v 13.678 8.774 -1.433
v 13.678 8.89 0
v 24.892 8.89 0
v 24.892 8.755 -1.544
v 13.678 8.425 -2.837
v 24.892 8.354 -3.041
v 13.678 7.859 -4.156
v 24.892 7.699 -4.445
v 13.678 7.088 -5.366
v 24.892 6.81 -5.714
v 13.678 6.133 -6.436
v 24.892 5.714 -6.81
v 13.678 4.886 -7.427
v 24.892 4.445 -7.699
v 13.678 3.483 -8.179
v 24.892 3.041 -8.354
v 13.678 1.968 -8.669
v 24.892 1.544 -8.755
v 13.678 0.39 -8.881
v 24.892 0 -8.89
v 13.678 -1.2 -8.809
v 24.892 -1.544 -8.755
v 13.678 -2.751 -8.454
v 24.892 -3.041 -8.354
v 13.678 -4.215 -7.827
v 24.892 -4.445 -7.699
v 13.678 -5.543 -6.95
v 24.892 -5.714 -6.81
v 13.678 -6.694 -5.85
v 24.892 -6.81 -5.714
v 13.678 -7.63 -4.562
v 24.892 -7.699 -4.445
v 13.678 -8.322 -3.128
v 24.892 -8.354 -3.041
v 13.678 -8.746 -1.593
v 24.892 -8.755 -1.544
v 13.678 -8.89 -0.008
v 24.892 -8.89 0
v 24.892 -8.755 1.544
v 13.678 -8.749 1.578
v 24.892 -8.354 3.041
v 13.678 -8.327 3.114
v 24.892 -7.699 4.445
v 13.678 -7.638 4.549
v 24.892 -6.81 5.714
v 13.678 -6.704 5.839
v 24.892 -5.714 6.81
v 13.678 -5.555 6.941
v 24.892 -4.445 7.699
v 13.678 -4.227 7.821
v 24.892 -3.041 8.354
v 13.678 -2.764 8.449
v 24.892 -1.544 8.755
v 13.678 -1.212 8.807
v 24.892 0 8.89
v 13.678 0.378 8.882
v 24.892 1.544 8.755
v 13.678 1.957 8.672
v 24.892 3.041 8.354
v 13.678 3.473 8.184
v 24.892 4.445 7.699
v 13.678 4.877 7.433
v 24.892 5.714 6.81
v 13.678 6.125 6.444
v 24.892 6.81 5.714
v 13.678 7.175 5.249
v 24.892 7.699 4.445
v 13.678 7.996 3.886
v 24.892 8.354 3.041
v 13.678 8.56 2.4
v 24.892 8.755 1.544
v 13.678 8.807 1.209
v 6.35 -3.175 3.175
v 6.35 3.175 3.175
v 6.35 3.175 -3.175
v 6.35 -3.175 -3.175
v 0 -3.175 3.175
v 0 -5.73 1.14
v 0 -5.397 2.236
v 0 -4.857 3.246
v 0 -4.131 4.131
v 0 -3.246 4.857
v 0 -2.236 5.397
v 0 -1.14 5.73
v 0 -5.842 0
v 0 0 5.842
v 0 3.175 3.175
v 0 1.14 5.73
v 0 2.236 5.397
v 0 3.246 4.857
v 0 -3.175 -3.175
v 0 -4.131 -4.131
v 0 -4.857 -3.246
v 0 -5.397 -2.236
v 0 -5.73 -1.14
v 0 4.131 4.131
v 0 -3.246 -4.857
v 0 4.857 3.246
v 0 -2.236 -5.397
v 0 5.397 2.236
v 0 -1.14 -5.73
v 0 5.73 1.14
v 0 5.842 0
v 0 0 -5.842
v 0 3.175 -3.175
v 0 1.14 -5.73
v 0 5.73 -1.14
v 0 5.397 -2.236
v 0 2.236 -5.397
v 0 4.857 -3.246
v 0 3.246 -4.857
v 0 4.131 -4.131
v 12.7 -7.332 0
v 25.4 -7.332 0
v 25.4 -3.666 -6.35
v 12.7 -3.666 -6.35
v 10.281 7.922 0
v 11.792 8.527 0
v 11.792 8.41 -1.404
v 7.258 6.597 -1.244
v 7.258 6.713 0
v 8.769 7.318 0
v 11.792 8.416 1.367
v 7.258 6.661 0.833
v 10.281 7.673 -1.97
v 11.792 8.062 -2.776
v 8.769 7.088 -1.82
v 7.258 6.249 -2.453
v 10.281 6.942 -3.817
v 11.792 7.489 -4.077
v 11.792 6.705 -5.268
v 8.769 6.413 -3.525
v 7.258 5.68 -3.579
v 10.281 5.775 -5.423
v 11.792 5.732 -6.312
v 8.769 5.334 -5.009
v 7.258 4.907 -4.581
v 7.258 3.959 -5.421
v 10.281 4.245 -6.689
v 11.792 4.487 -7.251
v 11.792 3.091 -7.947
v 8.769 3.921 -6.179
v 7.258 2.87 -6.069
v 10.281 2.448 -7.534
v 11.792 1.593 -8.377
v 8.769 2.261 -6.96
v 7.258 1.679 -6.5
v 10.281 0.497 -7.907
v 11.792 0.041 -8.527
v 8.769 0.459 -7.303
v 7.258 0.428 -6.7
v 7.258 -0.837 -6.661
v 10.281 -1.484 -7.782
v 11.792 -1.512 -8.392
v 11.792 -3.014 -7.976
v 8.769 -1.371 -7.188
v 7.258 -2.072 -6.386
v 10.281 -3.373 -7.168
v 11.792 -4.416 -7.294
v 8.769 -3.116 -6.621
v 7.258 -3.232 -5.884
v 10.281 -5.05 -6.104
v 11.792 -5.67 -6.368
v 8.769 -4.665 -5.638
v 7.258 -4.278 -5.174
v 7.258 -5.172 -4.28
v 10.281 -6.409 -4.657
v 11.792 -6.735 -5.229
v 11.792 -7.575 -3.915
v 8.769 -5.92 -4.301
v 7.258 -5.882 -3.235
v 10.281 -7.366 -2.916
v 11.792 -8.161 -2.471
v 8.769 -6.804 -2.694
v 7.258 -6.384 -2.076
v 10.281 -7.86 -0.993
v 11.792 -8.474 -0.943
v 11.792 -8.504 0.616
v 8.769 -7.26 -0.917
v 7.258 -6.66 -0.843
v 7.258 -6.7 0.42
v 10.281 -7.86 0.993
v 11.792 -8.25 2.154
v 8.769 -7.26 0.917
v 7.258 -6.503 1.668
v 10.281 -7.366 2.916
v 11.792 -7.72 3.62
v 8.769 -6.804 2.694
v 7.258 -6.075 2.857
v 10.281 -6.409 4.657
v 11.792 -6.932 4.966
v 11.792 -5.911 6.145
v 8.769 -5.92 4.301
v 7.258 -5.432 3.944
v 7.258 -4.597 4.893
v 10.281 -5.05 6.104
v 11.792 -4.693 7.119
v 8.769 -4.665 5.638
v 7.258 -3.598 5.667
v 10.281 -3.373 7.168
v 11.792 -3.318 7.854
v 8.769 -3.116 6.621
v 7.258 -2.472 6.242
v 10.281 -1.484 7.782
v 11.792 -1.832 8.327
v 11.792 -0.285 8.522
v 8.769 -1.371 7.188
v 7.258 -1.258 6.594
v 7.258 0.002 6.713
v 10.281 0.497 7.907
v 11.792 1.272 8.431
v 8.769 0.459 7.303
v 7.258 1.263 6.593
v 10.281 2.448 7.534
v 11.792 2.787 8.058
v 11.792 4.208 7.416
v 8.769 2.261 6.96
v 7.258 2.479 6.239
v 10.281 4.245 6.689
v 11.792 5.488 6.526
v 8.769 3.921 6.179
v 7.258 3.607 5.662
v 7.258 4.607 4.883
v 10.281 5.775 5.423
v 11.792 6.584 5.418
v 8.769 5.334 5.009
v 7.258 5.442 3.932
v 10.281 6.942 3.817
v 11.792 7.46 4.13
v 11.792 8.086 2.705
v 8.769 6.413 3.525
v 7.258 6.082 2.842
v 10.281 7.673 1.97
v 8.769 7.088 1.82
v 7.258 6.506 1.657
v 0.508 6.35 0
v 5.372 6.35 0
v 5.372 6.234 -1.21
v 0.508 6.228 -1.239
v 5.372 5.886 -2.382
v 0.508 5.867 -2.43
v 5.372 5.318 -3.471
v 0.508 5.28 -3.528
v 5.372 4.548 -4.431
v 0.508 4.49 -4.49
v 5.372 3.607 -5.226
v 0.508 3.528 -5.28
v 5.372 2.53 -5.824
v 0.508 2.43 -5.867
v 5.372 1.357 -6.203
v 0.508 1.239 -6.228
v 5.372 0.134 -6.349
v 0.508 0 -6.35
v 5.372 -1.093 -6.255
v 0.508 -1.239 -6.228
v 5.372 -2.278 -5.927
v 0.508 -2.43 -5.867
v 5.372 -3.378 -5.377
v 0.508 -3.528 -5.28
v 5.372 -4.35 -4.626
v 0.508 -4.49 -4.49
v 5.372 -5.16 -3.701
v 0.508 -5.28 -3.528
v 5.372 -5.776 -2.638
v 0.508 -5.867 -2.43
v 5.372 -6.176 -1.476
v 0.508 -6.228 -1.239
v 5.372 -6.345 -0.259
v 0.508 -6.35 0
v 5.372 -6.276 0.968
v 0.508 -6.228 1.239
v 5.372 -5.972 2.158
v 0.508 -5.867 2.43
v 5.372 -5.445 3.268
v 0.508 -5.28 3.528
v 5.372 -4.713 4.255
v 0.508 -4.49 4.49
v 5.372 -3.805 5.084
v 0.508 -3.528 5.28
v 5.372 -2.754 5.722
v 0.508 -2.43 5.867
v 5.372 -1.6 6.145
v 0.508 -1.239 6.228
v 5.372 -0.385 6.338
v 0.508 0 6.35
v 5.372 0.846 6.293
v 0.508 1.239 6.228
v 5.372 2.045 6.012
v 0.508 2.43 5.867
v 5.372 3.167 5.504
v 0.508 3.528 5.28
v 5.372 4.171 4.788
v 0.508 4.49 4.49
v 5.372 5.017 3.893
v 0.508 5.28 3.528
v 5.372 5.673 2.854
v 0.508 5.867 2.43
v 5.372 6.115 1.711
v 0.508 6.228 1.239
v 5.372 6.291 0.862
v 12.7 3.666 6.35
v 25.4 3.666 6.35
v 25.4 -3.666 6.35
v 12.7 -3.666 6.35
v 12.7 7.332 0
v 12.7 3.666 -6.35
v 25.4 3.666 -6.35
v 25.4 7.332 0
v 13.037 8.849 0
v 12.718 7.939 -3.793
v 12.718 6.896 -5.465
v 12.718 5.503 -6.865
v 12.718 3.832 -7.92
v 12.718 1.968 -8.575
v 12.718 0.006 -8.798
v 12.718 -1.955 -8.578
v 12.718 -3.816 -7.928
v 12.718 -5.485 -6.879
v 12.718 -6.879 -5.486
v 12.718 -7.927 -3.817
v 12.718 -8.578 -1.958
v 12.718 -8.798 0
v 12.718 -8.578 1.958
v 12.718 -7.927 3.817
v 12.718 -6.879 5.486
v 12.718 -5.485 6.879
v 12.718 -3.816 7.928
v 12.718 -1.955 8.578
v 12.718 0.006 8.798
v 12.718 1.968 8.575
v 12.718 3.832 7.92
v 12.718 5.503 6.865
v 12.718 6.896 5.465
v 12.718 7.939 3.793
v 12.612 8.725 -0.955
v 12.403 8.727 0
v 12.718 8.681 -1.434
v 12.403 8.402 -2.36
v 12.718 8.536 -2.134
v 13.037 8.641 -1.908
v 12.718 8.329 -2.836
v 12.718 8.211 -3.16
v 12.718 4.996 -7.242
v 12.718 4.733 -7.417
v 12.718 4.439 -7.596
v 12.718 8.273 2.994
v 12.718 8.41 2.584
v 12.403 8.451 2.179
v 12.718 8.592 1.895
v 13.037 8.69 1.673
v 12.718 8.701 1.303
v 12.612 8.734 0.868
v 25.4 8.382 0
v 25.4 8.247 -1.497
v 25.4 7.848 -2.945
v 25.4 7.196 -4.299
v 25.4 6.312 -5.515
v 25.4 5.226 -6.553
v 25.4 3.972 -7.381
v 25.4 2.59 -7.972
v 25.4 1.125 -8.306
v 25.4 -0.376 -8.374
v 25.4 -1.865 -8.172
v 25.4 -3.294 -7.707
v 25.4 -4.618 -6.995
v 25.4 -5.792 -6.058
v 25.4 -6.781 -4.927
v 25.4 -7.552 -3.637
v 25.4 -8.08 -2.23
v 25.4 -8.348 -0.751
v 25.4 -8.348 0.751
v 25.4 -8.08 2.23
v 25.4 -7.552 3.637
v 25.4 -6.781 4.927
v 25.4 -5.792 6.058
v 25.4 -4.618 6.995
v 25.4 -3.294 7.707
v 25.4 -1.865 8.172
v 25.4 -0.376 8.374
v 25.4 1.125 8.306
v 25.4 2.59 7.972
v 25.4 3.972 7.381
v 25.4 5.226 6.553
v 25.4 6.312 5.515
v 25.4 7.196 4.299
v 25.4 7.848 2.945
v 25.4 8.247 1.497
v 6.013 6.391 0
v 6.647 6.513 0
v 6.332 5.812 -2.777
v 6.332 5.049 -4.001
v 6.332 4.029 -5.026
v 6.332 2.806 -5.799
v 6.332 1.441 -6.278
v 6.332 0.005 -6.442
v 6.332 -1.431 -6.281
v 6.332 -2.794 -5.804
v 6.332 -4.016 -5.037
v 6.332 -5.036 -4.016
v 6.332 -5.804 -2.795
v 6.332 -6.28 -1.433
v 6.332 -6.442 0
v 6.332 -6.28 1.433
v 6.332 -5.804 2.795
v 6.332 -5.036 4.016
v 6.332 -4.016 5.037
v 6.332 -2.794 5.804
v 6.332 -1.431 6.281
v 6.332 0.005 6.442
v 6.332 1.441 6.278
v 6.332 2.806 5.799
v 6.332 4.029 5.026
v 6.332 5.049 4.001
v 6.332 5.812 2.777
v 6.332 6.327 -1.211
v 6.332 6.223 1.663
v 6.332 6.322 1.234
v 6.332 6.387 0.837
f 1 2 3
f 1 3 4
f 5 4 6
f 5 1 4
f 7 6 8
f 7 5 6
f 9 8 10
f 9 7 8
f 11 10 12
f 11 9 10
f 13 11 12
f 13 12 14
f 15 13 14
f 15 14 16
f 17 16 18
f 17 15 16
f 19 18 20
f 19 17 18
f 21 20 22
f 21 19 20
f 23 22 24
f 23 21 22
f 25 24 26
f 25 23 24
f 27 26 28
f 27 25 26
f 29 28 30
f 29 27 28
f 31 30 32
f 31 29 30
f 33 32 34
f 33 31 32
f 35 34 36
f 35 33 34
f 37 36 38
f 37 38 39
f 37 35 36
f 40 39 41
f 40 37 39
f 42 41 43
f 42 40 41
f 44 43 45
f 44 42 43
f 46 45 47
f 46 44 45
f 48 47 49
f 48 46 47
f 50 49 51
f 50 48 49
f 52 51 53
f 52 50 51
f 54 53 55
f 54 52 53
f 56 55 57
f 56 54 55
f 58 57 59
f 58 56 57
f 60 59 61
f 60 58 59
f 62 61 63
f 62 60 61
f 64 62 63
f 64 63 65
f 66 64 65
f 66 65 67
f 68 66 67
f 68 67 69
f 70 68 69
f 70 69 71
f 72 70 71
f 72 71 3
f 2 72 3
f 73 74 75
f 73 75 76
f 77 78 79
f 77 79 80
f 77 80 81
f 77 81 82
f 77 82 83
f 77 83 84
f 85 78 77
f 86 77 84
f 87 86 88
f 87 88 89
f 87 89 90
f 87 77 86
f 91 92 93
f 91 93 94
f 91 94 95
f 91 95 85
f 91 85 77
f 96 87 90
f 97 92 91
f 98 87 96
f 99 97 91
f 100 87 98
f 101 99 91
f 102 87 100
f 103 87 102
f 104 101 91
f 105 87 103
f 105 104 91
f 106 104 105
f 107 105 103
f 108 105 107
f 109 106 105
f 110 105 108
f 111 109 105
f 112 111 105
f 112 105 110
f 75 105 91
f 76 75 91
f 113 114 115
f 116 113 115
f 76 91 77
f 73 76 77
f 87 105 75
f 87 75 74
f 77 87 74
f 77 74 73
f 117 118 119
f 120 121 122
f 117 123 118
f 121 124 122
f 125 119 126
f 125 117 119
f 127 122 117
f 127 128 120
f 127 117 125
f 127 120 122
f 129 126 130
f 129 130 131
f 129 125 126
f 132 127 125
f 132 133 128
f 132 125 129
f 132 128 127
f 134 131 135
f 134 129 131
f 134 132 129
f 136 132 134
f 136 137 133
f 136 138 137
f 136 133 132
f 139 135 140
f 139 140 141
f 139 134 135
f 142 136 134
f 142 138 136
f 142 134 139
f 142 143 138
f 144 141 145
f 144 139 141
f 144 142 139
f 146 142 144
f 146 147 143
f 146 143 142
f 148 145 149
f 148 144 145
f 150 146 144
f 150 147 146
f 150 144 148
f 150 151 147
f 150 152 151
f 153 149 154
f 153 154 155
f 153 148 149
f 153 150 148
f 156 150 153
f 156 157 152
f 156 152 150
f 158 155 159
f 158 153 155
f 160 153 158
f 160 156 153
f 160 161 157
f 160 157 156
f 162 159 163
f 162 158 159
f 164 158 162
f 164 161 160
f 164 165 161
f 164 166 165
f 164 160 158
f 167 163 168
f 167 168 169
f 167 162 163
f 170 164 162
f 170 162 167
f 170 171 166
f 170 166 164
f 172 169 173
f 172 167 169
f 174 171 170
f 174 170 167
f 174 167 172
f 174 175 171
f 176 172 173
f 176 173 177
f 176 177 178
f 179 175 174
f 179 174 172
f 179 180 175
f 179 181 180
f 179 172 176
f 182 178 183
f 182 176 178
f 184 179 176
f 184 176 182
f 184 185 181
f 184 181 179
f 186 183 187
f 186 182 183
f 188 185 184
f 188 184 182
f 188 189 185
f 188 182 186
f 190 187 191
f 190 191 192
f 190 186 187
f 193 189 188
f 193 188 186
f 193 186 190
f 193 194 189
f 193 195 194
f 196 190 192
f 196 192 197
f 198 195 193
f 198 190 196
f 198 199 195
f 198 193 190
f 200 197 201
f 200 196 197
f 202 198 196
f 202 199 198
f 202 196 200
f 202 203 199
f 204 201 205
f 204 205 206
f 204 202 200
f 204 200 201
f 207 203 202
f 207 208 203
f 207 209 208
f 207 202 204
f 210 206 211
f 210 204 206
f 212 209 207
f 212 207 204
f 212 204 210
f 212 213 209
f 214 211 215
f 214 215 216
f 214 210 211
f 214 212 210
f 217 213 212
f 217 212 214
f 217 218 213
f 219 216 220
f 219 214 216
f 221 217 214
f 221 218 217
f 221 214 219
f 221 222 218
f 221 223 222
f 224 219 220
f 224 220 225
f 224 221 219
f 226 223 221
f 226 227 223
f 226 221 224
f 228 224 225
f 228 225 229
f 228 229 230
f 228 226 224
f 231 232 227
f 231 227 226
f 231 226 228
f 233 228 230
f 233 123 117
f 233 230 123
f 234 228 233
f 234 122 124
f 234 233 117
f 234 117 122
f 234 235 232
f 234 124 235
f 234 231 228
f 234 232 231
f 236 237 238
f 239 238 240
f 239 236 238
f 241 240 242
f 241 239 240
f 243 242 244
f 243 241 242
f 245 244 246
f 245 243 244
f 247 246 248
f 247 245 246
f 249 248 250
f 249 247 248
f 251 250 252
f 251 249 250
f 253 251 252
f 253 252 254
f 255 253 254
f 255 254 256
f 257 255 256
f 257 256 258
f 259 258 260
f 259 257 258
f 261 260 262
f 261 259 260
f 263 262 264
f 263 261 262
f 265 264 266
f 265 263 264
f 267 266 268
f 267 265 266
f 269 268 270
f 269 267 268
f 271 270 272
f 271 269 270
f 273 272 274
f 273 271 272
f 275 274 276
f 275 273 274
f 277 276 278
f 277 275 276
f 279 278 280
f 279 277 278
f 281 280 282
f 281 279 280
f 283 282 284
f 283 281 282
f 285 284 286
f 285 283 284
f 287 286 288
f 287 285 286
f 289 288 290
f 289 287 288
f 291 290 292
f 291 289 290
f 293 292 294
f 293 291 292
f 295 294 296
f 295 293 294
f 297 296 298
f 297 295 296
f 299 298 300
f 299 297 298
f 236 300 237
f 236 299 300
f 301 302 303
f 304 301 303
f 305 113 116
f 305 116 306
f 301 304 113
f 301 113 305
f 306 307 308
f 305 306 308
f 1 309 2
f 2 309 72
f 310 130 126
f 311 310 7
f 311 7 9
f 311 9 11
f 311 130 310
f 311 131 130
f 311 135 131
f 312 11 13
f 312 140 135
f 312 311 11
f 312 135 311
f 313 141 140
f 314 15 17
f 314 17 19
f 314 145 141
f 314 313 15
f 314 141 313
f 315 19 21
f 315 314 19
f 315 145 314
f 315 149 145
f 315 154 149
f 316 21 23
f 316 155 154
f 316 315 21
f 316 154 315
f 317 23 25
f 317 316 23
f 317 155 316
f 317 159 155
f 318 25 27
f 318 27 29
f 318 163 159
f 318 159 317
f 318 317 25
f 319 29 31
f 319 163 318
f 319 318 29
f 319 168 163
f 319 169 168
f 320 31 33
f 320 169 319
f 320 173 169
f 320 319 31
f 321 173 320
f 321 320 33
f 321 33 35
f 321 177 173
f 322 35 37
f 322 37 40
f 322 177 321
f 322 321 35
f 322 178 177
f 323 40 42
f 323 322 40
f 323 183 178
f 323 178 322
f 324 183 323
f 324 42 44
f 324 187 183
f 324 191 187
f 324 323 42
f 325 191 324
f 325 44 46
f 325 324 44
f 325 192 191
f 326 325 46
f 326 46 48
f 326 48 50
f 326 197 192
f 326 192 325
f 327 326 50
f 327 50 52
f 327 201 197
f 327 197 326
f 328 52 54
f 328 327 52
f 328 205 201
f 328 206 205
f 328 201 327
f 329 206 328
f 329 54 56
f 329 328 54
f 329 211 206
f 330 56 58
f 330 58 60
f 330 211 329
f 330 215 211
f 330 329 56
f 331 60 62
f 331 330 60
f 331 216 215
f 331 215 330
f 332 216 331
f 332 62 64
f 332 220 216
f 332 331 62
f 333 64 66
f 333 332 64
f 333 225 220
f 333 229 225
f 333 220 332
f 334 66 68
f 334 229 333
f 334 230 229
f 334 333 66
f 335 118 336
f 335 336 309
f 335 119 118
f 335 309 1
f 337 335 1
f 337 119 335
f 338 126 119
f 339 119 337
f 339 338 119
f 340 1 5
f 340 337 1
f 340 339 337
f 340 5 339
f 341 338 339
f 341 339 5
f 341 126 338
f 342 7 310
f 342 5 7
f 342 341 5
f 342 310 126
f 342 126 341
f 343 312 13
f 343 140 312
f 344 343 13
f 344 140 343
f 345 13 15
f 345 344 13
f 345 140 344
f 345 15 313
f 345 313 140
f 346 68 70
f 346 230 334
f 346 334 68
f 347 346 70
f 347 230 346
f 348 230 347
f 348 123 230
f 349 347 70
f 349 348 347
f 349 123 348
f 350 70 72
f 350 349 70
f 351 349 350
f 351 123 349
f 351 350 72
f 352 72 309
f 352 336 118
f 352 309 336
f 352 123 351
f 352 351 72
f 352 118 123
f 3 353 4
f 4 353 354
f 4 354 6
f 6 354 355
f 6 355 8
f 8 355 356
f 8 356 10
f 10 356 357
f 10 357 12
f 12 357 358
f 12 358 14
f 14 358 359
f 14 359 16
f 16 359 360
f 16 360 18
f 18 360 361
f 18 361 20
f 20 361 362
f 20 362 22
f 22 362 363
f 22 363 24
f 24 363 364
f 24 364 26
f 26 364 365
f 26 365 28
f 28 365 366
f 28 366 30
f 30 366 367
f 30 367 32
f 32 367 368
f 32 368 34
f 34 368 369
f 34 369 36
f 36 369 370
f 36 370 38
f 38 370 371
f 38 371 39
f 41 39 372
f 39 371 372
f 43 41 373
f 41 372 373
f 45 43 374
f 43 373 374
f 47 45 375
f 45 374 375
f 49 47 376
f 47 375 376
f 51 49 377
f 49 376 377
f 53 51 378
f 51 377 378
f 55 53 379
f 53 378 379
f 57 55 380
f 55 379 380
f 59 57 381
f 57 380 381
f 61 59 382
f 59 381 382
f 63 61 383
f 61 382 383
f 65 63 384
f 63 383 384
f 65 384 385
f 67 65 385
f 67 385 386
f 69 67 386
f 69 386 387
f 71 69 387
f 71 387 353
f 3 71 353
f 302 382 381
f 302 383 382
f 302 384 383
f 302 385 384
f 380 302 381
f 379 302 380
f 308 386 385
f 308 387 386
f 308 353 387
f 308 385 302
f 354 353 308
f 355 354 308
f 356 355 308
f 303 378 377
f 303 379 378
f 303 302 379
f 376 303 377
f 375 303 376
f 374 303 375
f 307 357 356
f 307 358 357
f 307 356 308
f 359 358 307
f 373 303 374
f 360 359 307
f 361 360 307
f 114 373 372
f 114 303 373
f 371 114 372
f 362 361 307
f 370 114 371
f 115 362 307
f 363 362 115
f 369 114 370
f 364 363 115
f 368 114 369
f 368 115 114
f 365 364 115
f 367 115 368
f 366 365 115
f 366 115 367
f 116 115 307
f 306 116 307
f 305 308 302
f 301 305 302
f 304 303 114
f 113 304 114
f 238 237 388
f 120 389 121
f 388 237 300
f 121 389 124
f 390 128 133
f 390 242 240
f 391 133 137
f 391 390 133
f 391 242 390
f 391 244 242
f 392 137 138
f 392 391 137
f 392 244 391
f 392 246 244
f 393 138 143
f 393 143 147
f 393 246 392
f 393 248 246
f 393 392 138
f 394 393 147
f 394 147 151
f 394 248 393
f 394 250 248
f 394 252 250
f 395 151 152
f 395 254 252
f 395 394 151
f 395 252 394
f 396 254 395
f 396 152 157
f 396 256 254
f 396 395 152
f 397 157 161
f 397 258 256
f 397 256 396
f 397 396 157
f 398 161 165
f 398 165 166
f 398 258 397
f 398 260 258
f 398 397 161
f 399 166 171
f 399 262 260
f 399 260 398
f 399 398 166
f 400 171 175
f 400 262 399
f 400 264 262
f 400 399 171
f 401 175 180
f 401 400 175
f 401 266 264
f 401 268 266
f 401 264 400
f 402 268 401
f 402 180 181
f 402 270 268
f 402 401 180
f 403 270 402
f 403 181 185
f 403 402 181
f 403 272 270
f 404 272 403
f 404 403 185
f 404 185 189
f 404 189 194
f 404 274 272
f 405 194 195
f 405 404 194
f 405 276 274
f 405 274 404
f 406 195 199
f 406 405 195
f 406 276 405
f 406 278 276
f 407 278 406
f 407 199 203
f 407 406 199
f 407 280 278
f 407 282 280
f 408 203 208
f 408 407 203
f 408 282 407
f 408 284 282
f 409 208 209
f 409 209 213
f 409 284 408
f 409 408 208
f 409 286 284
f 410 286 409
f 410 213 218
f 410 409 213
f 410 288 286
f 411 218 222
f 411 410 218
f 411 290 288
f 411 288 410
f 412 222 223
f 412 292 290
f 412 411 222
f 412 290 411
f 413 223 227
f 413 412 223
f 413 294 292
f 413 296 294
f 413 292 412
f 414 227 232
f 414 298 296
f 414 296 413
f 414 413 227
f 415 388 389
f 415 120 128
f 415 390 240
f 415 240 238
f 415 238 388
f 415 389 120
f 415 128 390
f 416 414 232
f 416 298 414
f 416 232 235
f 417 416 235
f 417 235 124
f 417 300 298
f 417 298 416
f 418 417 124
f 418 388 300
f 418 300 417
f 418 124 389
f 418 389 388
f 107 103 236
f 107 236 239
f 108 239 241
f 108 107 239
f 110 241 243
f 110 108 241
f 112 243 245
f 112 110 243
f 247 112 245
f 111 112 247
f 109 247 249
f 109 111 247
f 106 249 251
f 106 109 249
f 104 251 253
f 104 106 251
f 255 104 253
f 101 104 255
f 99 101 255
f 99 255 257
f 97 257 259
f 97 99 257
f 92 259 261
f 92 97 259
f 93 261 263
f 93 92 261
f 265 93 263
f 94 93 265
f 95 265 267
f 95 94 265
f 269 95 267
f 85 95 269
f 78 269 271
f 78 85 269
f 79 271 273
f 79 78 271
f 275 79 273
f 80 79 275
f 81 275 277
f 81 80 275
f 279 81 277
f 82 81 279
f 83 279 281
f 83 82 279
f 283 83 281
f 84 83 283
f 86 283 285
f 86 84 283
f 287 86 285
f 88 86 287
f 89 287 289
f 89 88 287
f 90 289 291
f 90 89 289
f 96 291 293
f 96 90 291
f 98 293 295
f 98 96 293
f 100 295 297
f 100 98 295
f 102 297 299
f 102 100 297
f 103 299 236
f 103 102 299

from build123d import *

# Parameters (mm, degrees)
F2_W     = 6.35
F2_H     = 6.35
F3_DEPTH = 6.35
F5_DEPTH = 12.7
F6_R     = 5.08
F7_SIZE  = 0.508


with BuildPart() as f1:
    # F0 (on Top) → F1 (revolve)
    with BuildSketch(Plane.XY):
        Polygon((0, 6.35), (0, 0), (25.4, 0), (25.4, 8.89), (12.7, 8.89), (6.35, 6.35), align=None)
    revolve(axis=Axis((-3.302, 0, 0), (-1, 0, 0)))

    # F2 (on face) → F3 (cut)
    with BuildSketch(Plane(origin=(0, 0, 0), x_dir=(0, -1, 0), z_dir=(-1, 0, 0))):
        Rectangle(F2_W, F2_H)
    extrude(amount=-F3_DEPTH, mode=Mode.SUBTRACT)

    # F4 (on face) → F5 (cut)
    with BuildSketch(Plane.YZ.offset(25.4)):
        Polygon((7.332348, 0), (3.666174, 6.35), (-3.666174, 6.35), (-7.332348, 0), (-3.666174, -6.35), (3.666174, -6.35), align=None)
    extrude(amount=-F5_DEPTH, mode=Mode.SUBTRACT)

    # F6
    f6_edges = [f1.edges().sort_by_distance(p)[0] for p in [
        (12.7, -8.89, 0),
        (6.35, -6.35, 0),
    ]]
    fillet(f6_edges, radius=F6_R)

    # F7
    f7_edges = [f1.edges().sort_by_distance(p)[0] for p in [
        (25.4, -8.89, 0),
        (0, -6.35, 0),
    ]]
    chamfer(f7_edges, length=F7_SIZE)


solid = f1.part
